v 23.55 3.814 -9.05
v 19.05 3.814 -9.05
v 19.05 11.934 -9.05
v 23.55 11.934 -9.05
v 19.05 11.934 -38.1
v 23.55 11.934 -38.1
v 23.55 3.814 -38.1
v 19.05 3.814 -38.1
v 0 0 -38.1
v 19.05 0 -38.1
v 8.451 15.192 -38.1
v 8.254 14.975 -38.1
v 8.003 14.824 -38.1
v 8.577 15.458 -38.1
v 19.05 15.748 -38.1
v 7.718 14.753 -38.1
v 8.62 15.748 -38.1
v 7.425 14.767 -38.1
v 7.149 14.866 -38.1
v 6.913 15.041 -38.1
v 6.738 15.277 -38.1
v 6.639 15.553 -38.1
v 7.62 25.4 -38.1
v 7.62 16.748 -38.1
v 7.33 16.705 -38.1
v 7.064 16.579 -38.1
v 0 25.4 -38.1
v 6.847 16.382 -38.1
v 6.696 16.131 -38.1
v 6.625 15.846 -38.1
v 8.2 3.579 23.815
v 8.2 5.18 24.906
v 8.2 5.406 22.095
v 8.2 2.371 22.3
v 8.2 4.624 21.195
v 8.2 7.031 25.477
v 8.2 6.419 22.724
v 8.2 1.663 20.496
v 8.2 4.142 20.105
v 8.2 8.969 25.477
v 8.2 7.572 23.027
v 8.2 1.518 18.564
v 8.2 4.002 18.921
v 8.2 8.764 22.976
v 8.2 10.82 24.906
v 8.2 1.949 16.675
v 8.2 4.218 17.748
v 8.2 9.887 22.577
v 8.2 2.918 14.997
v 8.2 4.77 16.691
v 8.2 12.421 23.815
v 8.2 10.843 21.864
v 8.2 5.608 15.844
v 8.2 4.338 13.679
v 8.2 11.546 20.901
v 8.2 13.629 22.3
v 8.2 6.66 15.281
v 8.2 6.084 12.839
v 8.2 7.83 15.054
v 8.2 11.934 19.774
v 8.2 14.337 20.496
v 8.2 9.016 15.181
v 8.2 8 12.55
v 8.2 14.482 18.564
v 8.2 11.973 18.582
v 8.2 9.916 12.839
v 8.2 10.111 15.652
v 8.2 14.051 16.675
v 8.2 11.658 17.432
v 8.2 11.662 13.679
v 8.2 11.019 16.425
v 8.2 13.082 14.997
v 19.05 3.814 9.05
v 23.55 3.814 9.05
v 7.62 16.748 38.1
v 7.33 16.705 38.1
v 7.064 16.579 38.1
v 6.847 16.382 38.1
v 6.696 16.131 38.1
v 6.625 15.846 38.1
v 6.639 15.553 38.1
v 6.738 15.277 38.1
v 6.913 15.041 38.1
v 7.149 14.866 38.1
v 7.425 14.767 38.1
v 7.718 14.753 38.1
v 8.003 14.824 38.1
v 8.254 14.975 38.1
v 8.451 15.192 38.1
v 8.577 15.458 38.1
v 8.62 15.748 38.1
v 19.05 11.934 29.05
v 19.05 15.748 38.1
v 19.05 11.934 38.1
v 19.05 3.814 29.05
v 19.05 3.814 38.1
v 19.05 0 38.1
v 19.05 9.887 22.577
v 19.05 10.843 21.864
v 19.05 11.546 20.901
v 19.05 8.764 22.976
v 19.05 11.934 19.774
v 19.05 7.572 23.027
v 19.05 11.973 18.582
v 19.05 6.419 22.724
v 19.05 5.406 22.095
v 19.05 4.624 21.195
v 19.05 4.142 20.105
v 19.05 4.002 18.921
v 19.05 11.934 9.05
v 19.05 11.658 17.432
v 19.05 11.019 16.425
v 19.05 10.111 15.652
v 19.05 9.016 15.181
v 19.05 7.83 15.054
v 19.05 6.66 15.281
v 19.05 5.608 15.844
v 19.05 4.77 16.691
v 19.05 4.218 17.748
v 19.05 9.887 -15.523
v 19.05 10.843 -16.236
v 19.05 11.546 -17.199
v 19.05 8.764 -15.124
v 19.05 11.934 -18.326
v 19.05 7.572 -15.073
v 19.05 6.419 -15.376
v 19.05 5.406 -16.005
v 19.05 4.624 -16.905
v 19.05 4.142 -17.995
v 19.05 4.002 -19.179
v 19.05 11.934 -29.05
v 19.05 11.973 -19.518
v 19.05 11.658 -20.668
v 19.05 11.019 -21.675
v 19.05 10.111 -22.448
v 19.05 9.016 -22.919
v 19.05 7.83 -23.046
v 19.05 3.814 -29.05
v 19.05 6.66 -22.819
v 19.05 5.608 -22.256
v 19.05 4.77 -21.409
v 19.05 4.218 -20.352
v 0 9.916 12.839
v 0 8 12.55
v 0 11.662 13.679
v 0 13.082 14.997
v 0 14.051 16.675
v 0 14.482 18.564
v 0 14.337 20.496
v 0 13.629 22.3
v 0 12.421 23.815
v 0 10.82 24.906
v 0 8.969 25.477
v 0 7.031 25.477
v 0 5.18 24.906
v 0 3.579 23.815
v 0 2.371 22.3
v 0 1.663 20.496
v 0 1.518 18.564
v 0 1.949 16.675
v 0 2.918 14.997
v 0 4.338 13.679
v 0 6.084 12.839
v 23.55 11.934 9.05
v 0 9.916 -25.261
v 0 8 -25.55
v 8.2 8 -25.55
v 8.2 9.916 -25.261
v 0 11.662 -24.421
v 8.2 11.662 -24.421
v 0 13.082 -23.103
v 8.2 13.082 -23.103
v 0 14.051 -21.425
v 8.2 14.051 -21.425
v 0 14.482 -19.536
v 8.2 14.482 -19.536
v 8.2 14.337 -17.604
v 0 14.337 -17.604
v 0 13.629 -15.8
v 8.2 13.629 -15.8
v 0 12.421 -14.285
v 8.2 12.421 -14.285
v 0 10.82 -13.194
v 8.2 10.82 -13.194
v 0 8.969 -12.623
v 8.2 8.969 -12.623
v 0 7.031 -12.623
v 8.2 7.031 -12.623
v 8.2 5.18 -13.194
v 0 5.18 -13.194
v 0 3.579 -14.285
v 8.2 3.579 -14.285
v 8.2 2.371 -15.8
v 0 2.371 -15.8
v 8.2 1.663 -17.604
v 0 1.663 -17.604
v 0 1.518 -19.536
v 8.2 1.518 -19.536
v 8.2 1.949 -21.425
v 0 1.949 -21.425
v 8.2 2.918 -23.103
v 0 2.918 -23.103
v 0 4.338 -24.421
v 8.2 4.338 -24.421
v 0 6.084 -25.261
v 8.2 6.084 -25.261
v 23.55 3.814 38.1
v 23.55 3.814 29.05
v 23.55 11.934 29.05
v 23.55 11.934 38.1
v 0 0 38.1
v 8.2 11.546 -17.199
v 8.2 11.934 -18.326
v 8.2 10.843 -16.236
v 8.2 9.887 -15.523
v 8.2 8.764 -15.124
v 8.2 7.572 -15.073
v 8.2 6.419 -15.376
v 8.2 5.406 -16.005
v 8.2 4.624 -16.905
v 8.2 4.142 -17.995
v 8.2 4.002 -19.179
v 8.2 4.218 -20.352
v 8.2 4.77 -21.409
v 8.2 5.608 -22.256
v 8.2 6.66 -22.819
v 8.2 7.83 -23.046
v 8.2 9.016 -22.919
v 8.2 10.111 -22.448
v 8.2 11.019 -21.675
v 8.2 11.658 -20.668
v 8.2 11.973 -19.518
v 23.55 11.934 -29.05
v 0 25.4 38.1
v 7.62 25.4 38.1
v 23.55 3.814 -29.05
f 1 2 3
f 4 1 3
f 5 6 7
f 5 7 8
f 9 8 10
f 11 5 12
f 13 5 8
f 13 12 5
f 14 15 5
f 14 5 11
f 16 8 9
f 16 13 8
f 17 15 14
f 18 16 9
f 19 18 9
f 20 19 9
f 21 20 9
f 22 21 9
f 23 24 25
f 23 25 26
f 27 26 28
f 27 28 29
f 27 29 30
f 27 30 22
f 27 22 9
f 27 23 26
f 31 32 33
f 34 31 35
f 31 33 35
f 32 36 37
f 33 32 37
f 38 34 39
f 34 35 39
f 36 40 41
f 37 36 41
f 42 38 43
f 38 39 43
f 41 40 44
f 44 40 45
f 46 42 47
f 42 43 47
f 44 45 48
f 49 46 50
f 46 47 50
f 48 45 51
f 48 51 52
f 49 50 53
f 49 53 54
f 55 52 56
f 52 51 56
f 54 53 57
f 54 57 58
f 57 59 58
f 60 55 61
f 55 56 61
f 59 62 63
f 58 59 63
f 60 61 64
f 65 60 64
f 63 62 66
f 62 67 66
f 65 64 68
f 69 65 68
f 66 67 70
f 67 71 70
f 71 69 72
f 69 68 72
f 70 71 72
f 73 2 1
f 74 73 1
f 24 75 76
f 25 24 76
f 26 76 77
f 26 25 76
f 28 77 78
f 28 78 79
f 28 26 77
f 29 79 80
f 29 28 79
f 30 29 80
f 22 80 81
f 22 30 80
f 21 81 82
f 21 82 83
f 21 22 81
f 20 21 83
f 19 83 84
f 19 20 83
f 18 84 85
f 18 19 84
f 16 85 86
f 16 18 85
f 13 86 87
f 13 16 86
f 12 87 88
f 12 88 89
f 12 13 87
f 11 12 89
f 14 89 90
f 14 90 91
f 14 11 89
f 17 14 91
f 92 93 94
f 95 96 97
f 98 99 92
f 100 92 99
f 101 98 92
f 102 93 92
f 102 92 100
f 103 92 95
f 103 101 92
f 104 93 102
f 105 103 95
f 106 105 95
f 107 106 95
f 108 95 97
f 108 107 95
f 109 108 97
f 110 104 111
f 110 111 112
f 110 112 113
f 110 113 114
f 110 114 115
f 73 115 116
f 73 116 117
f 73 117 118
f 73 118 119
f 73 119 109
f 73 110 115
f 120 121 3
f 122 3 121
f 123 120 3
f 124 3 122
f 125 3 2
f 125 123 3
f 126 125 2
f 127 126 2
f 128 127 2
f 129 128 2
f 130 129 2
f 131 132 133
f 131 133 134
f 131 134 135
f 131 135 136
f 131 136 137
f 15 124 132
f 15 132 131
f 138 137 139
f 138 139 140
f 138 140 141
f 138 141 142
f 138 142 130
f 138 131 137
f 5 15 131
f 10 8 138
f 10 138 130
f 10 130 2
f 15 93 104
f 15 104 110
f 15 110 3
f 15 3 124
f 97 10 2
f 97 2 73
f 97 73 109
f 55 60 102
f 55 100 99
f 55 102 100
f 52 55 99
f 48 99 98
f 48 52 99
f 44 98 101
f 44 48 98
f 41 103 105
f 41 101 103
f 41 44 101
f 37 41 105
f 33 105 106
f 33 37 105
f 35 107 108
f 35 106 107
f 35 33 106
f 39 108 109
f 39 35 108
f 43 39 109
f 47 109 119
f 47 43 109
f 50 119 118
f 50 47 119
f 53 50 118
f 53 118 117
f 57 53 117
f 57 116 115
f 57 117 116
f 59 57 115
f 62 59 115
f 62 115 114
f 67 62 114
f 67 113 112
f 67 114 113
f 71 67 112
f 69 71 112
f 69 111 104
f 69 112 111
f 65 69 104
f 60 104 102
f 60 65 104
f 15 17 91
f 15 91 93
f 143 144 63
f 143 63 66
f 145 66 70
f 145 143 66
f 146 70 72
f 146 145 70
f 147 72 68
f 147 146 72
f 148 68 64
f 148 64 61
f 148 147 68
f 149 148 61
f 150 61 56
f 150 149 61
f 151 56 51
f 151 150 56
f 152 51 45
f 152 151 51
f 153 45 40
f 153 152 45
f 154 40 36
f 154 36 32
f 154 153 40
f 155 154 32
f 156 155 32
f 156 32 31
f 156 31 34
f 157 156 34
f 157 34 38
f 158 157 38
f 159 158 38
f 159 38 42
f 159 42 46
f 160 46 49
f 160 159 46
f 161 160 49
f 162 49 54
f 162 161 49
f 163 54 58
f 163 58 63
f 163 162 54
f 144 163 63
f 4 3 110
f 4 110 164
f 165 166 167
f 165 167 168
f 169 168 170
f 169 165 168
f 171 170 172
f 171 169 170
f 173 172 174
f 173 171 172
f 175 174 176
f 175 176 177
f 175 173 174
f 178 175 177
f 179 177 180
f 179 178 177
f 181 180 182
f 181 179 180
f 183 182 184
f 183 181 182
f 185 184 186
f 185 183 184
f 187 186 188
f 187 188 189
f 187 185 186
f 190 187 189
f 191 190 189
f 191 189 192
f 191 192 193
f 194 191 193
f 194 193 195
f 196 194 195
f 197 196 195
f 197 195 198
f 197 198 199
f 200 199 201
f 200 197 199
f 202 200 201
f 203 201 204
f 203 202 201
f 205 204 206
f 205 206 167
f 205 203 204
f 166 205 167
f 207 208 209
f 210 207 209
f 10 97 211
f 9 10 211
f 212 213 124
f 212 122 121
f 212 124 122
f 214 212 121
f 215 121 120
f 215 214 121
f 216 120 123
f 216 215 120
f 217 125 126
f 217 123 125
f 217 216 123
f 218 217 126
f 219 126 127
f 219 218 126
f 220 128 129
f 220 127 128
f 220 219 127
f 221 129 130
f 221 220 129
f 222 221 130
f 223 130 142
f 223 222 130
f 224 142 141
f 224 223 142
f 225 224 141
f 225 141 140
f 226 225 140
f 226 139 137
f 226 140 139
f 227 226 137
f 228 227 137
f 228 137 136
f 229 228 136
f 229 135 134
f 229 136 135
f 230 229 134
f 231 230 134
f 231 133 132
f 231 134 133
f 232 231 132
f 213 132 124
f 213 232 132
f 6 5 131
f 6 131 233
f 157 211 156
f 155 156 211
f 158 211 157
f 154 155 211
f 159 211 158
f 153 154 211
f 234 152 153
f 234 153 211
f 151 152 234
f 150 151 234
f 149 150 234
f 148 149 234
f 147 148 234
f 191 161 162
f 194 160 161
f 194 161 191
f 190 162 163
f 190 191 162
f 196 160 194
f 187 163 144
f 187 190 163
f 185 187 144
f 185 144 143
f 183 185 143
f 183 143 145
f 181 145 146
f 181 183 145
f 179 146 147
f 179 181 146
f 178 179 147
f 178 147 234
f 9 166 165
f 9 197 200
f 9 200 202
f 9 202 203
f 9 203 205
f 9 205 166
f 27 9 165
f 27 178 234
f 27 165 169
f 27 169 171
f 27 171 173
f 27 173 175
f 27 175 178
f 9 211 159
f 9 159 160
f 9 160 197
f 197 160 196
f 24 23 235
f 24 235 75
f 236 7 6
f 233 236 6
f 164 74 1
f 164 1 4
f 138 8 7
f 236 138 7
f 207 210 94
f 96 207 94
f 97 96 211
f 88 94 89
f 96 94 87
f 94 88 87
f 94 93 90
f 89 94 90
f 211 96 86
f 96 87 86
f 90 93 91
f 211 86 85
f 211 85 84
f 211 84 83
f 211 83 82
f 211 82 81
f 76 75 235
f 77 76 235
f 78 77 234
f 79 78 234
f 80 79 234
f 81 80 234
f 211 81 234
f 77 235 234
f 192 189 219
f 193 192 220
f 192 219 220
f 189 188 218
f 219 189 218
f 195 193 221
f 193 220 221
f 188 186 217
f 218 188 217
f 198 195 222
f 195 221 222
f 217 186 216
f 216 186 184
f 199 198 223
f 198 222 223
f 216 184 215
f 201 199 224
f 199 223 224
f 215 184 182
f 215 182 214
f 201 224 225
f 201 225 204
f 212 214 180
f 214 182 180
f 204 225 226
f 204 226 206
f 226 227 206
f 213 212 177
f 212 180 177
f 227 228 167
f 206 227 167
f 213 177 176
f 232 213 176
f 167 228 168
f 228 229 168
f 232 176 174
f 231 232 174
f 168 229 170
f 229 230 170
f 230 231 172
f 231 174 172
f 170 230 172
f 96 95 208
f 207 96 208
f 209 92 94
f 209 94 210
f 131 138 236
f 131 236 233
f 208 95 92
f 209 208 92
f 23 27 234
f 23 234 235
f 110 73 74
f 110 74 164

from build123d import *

# Parameters (mm, degrees)
BOSS_EXTRUDE1_DEPTH      = 38.1
BOSS_EXTRUDE1_DEPTH_BACK = 38.1
SKETCH1_W                = 4.5
SKETCH1_H                = 8.12
SKETCH2_R                = 4
CUT_EXTRUDE1_DEPTH       = 55.4
SKETCH3_R                = 6.5
CUT_EXTRUDE2_DEPTH       = 8.2
CUT_EXTRUDE3_START       = 19.05
SKETCH4_W                = 20
SKETCH4_H                = 15
CUT_EXTRUDE3_DEPTH       = 10


with BuildPart() as part:
    # Sketch1 → Boss-Extrude1 (new, two sides: drawn at the far end of the back side and taken through both)
    with BuildSketch(Plane.XY.offset(-BOSS_EXTRUDE1_DEPTH_BACK)):
        with BuildLine():
            ThreePointArc((7.62, 16.748), (6.912893219, 15.040893219), (8.62, 15.748))
            Line((8.62, 15.748), (19.05, 15.748))
            Line((19.05, 15.748), (19.05, 0))
            Line((19.05, 0), (0, 0))
            Line((0, 0), (0, 25.4))
            Line((0, 25.4), (7.62, 25.4))
            Line((7.62, 25.4), (7.62, 16.748))
        make_face()
        with Locations((21.3, 7.874)):
            Rectangle(SKETCH1_W, SKETCH1_H)
    extrude(amount=BOSS_EXTRUDE1_DEPTH + BOSS_EXTRUDE1_DEPTH_BACK)

    # Sketch2 → Cut-Extrude1 (cut)
    with BuildSketch(Plane(origin=(0, 0, 0), x_dir=(0, 0, -1), z_dir=(1, 0, 0))):
        with Locations(Location((-19.05, 8, 0), (0, 0, 100.422660027))):
            Circle(SKETCH2_R)
        with Locations(Location((19.05, 8, 0), (0, 0, 100.422660027))):
            Circle(SKETCH2_R)
    extrude(amount=CUT_EXTRUDE1_DEPTH, mode=Mode.SUBTRACT)

    # Sketch3 → Cut-Extrude2 (cut)
    with BuildSketch(Plane(origin=(0, 0, 0), x_dir=(0, 0, -1), z_dir=(1, 0, 0))):
        with Locations((-19.05, 8)):
            Circle(SKETCH3_R)
        with Locations((19.05, 8)):
            Circle(SKETCH3_R)
    extrude(amount=CUT_EXTRUDE2_DEPTH, mode=Mode.SUBTRACT)

    # Sketch4 → Cut-Extrude3 (cut)
    with BuildSketch(Plane(origin=(0, 0, 0), x_dir=(0, 0, -1), z_dir=(1, 0, 0)).offset(CUT_EXTRUDE3_START)):
        with Locations((-19.05, 8)):
            Rectangle(SKETCH4_W, SKETCH4_H)
        with Locations((19.05, 8)):
            Rectangle(SKETCH4_W, SKETCH4_H)
    extrude(amount=CUT_EXTRUDE3_DEPTH, mode=Mode.SUBTRACT)


solid = part.part
